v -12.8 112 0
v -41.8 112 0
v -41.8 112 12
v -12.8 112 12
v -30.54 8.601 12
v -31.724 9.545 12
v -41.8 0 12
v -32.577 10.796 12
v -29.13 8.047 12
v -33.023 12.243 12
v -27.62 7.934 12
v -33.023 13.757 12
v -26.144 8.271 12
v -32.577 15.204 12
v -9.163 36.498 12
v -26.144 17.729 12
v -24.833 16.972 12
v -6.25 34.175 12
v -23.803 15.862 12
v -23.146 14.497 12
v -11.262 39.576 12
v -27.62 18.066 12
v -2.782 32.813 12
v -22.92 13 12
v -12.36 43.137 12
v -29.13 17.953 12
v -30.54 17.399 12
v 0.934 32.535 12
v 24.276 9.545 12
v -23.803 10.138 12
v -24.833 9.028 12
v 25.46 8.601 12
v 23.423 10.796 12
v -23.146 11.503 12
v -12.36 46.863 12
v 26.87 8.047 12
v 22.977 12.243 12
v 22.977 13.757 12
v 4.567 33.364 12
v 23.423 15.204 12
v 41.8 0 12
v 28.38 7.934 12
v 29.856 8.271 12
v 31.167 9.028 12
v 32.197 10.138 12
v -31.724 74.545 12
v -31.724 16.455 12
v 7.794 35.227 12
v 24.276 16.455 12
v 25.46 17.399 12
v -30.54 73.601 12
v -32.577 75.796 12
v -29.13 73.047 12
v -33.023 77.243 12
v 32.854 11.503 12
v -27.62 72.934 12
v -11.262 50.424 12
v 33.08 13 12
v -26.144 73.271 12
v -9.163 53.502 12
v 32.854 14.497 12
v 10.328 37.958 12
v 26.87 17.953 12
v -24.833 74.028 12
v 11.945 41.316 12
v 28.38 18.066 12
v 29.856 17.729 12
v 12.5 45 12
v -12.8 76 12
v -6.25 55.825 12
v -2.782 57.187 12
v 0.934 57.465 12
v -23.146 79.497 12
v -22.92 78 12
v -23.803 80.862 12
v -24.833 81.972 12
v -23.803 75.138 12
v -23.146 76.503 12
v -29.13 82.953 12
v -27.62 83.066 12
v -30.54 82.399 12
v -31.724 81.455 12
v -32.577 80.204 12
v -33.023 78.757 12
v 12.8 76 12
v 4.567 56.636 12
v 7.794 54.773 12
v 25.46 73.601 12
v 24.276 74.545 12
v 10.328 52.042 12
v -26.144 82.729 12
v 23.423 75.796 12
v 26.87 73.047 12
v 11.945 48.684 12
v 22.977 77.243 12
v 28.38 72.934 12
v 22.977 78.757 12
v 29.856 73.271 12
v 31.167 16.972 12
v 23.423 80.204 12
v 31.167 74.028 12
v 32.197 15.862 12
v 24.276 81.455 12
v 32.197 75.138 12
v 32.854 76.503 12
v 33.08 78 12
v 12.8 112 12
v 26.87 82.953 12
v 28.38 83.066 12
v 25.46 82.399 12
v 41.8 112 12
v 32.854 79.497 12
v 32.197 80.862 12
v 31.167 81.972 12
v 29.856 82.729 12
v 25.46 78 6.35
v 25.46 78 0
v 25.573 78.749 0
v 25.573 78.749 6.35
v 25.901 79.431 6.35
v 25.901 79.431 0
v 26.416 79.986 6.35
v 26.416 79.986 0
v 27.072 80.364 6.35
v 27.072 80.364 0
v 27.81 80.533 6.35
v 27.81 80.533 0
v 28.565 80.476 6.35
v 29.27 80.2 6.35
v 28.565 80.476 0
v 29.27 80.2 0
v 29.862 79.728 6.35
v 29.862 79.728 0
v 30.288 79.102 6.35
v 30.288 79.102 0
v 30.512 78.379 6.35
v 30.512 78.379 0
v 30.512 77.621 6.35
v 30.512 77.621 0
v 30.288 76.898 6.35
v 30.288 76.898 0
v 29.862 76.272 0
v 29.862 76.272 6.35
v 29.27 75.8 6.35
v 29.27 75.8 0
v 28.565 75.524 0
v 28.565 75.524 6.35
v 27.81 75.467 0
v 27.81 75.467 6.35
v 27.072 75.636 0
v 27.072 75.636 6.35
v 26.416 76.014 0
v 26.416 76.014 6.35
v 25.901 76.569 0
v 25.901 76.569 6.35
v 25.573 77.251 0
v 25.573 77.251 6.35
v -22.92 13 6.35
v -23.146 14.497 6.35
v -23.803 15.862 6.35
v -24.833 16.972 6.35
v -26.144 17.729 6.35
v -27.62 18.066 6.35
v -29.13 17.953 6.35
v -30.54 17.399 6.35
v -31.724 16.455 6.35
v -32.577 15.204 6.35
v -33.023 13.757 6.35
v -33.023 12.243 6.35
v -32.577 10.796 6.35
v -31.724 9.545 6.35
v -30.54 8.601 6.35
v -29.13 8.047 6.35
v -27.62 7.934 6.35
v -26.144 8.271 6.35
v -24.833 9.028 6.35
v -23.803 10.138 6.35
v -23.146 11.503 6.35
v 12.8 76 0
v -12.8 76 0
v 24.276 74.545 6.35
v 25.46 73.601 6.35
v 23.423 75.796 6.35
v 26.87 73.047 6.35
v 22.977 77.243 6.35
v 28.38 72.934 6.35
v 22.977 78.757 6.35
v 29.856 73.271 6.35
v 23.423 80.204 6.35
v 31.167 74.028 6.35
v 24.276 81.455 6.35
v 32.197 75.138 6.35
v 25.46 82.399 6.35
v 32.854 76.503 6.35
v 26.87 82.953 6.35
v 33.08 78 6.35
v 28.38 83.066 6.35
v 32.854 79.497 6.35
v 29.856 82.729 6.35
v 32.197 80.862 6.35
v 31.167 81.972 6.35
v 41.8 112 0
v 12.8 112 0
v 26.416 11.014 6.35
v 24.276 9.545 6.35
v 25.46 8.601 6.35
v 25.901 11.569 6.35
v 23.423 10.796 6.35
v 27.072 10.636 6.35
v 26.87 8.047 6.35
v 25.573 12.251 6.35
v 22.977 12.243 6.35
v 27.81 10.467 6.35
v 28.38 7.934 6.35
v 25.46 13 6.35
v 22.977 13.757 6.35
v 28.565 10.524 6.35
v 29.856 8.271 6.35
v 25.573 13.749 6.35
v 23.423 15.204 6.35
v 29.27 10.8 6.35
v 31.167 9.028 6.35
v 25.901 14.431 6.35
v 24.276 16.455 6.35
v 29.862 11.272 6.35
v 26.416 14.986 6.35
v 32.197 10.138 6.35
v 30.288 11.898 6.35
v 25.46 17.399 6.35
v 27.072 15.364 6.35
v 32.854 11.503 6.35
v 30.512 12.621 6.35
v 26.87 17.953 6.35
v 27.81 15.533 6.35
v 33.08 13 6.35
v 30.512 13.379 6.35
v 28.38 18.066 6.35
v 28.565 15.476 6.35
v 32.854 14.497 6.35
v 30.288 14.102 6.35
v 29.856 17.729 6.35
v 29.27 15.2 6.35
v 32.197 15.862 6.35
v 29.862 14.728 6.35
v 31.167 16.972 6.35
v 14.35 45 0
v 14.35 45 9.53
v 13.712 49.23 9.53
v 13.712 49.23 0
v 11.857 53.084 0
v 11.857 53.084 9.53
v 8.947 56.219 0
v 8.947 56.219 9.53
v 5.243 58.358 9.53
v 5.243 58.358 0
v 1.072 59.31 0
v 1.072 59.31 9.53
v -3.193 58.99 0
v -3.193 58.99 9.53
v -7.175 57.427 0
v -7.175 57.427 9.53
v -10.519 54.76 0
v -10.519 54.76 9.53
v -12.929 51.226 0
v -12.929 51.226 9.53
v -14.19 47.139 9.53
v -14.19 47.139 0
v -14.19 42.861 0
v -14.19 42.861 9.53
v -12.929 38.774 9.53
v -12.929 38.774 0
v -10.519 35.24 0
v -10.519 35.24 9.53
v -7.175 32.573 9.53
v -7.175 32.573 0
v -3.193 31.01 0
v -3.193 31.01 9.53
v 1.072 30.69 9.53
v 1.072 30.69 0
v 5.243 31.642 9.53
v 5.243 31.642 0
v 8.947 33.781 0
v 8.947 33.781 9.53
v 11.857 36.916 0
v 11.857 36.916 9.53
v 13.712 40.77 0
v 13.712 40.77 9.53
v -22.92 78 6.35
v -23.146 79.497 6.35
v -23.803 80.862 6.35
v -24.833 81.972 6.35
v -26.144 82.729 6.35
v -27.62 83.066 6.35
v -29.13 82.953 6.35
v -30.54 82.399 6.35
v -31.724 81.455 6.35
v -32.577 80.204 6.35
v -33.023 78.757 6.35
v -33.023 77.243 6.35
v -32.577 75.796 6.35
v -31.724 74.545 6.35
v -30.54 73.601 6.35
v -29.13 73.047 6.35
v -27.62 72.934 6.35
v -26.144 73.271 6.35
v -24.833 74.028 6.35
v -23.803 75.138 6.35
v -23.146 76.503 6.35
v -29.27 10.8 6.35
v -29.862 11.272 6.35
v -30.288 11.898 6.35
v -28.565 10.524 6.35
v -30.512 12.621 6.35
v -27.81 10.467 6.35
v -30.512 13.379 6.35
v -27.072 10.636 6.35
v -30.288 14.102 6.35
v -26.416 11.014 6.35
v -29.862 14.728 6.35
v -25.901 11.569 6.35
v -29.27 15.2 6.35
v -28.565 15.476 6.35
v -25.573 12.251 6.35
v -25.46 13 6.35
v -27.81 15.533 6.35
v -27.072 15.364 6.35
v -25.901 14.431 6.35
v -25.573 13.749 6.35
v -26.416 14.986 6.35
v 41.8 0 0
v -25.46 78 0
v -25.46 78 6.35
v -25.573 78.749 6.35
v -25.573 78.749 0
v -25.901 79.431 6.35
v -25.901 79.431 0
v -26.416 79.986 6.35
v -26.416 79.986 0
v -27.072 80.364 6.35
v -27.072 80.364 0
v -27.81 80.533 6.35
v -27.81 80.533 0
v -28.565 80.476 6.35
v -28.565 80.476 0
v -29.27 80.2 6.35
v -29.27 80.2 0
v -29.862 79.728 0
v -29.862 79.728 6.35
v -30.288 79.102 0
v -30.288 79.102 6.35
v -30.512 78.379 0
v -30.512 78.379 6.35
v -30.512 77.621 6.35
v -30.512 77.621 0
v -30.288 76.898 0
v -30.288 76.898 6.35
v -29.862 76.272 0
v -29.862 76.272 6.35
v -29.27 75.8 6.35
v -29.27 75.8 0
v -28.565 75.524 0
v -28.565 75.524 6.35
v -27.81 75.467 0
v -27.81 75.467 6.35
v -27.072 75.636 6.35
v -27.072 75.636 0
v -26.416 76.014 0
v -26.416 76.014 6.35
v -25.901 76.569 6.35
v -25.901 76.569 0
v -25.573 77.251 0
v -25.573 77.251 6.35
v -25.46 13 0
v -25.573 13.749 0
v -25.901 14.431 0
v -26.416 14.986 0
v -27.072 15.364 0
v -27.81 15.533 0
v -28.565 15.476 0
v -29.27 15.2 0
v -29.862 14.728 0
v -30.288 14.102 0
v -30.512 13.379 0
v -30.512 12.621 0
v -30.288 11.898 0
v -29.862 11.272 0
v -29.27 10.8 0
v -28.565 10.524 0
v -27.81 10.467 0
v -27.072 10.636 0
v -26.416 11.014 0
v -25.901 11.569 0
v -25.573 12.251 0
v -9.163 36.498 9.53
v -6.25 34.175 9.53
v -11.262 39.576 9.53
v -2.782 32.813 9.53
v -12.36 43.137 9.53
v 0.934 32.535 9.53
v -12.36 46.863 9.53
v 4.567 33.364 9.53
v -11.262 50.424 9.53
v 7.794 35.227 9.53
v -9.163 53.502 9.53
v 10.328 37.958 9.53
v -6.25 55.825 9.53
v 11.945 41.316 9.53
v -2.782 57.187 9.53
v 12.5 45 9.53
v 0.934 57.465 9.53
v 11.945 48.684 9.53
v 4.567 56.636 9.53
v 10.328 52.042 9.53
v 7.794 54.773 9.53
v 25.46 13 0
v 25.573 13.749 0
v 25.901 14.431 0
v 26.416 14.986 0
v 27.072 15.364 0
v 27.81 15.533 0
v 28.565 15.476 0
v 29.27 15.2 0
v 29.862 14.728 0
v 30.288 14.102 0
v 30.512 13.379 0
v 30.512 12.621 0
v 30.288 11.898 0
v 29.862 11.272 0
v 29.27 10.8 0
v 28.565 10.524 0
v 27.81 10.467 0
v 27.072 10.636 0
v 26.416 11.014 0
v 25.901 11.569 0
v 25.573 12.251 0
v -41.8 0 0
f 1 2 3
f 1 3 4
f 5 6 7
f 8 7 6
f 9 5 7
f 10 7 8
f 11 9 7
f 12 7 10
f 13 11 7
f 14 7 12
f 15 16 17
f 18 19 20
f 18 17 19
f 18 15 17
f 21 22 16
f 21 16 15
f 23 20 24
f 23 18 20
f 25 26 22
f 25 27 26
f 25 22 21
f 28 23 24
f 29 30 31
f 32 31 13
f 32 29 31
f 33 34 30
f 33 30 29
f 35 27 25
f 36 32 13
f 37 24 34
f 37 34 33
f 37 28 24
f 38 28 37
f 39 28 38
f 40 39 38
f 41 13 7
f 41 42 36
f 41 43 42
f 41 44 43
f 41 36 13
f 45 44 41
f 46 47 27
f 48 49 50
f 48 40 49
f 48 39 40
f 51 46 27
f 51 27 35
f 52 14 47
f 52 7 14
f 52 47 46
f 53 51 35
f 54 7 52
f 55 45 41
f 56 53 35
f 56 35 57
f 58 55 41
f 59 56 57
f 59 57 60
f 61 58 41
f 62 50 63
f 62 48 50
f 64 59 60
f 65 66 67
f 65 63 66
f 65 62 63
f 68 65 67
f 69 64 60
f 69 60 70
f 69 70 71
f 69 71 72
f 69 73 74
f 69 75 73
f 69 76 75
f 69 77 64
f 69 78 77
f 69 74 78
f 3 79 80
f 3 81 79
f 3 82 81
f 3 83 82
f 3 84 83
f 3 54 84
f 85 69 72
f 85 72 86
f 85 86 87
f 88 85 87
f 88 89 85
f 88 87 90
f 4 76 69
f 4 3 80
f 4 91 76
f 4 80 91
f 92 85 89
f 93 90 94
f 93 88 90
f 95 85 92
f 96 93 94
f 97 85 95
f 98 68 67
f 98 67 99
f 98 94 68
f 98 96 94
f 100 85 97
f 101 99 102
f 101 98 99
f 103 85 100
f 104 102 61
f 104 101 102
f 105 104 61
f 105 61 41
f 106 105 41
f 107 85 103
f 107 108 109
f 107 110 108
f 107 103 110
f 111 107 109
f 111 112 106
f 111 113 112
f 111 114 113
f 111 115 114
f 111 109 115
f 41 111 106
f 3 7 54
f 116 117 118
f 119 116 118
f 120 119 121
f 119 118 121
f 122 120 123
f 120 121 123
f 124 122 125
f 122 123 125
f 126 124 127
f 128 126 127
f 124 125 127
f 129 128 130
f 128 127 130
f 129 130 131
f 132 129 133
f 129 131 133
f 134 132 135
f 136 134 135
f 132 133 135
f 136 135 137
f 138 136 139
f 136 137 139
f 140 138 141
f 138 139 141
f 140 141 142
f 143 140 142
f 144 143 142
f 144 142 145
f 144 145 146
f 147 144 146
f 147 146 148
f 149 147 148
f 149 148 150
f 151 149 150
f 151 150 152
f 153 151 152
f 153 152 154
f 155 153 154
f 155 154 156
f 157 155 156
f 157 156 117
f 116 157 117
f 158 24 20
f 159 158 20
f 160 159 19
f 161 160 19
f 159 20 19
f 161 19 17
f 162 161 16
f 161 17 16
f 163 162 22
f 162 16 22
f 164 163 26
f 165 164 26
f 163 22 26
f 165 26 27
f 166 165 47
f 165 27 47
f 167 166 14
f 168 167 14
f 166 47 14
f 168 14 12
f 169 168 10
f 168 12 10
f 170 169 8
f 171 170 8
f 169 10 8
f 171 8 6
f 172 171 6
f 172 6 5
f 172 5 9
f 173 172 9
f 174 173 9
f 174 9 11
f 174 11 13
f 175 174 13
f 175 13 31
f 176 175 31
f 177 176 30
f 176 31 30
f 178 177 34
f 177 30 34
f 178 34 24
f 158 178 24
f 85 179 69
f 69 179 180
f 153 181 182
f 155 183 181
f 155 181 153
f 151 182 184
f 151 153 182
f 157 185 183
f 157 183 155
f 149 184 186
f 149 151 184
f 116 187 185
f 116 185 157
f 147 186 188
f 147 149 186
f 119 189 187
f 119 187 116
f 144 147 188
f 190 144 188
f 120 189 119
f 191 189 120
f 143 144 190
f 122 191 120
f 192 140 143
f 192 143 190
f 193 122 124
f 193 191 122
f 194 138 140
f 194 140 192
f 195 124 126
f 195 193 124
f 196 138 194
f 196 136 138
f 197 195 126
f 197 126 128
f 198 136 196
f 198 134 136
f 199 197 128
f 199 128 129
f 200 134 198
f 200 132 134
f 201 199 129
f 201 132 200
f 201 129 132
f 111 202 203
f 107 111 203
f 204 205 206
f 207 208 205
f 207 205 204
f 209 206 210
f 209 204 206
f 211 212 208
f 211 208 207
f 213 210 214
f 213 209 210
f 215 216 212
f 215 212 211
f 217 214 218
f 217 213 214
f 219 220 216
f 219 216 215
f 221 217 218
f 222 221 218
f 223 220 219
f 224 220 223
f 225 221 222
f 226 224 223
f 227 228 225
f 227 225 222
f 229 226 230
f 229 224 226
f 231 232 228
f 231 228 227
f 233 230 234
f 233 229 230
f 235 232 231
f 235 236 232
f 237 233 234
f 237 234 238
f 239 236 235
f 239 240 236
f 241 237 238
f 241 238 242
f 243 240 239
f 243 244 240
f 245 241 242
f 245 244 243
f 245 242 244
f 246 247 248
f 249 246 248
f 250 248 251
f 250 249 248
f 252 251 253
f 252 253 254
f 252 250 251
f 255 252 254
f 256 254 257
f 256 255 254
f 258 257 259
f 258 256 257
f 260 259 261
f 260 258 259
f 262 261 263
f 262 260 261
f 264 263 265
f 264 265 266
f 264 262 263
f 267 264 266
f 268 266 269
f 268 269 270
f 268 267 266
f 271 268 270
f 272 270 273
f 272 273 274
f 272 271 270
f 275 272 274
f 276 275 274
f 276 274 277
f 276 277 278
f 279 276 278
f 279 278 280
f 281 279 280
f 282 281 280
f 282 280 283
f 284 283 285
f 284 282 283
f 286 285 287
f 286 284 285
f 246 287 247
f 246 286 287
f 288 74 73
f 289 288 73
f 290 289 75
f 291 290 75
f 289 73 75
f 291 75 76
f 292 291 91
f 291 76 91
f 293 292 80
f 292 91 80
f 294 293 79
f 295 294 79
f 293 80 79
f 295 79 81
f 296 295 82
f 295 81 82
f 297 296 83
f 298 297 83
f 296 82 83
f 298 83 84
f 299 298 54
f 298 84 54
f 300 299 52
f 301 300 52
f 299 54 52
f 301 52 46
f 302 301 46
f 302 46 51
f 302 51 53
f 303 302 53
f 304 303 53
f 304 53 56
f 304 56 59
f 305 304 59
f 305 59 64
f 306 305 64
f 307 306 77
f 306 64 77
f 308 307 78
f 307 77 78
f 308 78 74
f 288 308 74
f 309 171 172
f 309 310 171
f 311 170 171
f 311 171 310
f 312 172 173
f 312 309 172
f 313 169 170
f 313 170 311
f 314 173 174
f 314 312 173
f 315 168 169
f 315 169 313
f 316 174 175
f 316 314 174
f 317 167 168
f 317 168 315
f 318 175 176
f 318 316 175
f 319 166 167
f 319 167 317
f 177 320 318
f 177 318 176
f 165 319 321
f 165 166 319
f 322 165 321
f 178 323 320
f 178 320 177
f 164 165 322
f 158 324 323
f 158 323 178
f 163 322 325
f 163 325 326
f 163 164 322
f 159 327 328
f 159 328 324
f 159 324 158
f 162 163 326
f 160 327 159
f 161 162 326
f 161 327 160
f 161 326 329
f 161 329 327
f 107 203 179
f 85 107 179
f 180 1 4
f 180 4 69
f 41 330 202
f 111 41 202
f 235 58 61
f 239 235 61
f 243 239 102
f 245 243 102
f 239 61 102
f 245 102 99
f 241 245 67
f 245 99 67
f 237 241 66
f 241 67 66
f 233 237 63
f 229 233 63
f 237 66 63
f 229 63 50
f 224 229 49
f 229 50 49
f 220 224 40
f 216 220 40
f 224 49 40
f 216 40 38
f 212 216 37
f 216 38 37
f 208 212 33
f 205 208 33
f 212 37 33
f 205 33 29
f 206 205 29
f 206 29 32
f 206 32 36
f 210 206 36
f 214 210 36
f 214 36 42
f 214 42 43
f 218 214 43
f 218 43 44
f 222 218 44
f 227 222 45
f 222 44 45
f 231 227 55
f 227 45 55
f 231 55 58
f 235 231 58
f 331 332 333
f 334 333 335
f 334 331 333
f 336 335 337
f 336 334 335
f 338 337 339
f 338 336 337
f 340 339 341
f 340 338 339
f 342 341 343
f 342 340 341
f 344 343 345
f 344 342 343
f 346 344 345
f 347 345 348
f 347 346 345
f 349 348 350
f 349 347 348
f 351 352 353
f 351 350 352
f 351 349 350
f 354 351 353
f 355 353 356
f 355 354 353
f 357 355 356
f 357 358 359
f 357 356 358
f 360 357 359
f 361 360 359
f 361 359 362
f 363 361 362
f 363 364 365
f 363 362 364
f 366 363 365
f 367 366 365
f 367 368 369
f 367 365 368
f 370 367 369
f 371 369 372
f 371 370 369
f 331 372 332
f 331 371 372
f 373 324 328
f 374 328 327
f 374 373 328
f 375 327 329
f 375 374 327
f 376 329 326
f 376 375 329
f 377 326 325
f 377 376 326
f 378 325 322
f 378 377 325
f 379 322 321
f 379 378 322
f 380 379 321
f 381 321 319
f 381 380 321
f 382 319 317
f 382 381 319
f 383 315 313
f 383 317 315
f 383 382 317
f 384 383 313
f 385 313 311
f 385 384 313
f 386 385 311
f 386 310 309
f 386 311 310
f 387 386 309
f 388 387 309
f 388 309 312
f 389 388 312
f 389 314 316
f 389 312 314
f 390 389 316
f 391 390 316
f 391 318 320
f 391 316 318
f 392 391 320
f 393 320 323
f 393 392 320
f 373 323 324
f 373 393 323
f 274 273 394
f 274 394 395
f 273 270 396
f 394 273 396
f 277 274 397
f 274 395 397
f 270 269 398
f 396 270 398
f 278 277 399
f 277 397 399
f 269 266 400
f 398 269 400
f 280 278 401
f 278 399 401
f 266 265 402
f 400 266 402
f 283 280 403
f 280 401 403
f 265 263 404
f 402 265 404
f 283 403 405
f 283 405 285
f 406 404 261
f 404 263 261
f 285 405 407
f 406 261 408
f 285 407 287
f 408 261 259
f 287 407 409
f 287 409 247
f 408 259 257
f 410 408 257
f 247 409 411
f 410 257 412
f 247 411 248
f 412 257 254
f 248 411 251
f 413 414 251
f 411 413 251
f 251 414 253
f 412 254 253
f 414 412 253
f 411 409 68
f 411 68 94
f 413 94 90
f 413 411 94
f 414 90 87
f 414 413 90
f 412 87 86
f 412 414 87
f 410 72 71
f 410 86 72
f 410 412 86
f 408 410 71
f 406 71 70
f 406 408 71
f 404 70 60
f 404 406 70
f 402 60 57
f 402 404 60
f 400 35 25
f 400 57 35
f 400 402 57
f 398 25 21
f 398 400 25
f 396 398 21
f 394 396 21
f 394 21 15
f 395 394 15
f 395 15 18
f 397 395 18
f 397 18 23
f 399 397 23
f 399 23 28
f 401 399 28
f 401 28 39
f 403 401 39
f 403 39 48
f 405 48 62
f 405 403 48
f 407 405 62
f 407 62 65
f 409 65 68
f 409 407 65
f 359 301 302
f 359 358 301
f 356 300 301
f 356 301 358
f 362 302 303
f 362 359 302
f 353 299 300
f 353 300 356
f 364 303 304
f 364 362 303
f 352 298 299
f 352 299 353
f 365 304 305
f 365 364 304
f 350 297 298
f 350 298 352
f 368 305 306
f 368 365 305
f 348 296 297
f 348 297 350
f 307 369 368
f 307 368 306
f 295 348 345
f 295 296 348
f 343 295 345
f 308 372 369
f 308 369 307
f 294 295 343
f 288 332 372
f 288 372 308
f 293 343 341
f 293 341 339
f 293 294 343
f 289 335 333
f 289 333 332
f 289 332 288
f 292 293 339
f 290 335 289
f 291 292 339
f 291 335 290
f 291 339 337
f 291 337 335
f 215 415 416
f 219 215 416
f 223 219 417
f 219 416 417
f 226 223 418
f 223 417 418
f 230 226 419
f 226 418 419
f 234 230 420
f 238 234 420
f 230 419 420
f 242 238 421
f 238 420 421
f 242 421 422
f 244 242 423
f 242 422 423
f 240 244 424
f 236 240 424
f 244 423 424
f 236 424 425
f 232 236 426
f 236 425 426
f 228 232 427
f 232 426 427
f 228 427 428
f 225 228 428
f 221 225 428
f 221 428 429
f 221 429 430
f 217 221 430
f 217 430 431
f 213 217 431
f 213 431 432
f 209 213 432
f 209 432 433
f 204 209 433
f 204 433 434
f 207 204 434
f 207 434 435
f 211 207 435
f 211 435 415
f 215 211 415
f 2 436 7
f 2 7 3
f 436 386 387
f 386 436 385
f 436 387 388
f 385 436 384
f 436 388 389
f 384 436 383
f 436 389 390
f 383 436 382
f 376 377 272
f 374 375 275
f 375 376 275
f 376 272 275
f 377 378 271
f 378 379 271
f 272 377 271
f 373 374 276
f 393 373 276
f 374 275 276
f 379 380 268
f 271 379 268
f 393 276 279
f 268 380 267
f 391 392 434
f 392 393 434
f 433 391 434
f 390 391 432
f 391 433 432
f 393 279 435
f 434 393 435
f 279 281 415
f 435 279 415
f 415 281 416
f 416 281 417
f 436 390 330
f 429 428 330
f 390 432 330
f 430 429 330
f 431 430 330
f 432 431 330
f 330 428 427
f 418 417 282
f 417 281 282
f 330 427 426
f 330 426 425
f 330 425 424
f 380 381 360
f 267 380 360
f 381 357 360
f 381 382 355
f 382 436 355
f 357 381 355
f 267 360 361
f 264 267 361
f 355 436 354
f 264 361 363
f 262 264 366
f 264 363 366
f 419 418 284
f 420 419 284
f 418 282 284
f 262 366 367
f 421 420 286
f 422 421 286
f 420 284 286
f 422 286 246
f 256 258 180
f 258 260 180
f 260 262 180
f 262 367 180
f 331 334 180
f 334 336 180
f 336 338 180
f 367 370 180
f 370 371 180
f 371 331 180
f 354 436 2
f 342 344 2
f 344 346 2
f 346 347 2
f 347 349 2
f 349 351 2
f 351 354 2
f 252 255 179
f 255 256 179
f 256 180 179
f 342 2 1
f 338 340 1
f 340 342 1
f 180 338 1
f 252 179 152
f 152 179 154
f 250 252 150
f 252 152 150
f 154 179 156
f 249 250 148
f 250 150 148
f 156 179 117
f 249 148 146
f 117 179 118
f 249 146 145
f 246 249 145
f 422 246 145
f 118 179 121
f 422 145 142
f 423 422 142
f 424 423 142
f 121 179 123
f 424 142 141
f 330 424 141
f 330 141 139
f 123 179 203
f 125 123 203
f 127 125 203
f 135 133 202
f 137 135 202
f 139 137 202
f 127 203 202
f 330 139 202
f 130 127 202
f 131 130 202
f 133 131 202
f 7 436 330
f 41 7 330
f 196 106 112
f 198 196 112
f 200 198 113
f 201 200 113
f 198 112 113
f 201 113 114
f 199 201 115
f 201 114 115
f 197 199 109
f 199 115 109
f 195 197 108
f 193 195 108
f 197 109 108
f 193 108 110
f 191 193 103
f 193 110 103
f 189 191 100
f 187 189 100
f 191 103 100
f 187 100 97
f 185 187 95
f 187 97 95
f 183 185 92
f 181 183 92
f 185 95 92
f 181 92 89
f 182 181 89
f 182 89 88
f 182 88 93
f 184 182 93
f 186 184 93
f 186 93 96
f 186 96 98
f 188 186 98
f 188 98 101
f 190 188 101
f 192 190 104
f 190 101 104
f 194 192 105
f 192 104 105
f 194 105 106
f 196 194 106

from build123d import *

# Parameters (mm, degrees)
SKETCH_R        = 2.54
PAD_DEPTH       = 12
SKETCH001_R     = 14.35
POCKET_DEPTH    = 9.53
SKETCH002_R     = 12.5
POCKET001_DEPTH = 12.001
SKETCH003_R     = 5.08
POCKET002_DEPTH = 5.65


with BuildPart() as part:
    # Sketch → Pad (new body)
    with BuildSketch(Plane.XY):
        Polygon((0, 0), (-41.8, 0), (-41.8, 112), (-12.8, 112), (-12.8, 76), (0, 76), align=None)
        with Locations((-28, 13)):
            Circle(SKETCH_R, mode=Mode.SUBTRACT)
        with Locations((-28, 78)):
            Circle(SKETCH_R, mode=Mode.SUBTRACT)
    pad = extrude(amount=PAD_DEPTH)

    # Mirrored: Pad across Sketch V_Axis
    add(pad.mirror(Plane(origin=(0, 0, 0), x_dir=(0, 0, 1), z_dir=(1, 0, 0))))

    # Sketch001 → Pocket (cut)
    with BuildSketch(Plane.XY):
        with Locations((0, 45)):
            Circle(SKETCH001_R)
    extrude(amount=POCKET_DEPTH, mode=Mode.SUBTRACT)

    # Sketch002 → Pocket001 (cut, through all)
    with BuildSketch(Plane.XY):
        with Locations((0, 45)):
            Circle(SKETCH002_R)
    extrude(amount=POCKET001_DEPTH, mode=Mode.SUBTRACT)

    # Sketch003 (on Face5 of Pocket001) → Pocket002 (cut)
    with BuildSketch(Plane.XY.offset(12)):
        with Locations((-28, 13)):
            Circle(SKETCH003_R)
        with Locations((-28, 78)):
            Circle(SKETCH003_R)
        with Locations((28, 78)):
            Circle(SKETCH003_R)
        with Locations((28, 13)):
            Circle(SKETCH003_R)
    extrude(amount=-POCKET002_DEPTH, mode=Mode.SUBTRACT)


solid = part.part
